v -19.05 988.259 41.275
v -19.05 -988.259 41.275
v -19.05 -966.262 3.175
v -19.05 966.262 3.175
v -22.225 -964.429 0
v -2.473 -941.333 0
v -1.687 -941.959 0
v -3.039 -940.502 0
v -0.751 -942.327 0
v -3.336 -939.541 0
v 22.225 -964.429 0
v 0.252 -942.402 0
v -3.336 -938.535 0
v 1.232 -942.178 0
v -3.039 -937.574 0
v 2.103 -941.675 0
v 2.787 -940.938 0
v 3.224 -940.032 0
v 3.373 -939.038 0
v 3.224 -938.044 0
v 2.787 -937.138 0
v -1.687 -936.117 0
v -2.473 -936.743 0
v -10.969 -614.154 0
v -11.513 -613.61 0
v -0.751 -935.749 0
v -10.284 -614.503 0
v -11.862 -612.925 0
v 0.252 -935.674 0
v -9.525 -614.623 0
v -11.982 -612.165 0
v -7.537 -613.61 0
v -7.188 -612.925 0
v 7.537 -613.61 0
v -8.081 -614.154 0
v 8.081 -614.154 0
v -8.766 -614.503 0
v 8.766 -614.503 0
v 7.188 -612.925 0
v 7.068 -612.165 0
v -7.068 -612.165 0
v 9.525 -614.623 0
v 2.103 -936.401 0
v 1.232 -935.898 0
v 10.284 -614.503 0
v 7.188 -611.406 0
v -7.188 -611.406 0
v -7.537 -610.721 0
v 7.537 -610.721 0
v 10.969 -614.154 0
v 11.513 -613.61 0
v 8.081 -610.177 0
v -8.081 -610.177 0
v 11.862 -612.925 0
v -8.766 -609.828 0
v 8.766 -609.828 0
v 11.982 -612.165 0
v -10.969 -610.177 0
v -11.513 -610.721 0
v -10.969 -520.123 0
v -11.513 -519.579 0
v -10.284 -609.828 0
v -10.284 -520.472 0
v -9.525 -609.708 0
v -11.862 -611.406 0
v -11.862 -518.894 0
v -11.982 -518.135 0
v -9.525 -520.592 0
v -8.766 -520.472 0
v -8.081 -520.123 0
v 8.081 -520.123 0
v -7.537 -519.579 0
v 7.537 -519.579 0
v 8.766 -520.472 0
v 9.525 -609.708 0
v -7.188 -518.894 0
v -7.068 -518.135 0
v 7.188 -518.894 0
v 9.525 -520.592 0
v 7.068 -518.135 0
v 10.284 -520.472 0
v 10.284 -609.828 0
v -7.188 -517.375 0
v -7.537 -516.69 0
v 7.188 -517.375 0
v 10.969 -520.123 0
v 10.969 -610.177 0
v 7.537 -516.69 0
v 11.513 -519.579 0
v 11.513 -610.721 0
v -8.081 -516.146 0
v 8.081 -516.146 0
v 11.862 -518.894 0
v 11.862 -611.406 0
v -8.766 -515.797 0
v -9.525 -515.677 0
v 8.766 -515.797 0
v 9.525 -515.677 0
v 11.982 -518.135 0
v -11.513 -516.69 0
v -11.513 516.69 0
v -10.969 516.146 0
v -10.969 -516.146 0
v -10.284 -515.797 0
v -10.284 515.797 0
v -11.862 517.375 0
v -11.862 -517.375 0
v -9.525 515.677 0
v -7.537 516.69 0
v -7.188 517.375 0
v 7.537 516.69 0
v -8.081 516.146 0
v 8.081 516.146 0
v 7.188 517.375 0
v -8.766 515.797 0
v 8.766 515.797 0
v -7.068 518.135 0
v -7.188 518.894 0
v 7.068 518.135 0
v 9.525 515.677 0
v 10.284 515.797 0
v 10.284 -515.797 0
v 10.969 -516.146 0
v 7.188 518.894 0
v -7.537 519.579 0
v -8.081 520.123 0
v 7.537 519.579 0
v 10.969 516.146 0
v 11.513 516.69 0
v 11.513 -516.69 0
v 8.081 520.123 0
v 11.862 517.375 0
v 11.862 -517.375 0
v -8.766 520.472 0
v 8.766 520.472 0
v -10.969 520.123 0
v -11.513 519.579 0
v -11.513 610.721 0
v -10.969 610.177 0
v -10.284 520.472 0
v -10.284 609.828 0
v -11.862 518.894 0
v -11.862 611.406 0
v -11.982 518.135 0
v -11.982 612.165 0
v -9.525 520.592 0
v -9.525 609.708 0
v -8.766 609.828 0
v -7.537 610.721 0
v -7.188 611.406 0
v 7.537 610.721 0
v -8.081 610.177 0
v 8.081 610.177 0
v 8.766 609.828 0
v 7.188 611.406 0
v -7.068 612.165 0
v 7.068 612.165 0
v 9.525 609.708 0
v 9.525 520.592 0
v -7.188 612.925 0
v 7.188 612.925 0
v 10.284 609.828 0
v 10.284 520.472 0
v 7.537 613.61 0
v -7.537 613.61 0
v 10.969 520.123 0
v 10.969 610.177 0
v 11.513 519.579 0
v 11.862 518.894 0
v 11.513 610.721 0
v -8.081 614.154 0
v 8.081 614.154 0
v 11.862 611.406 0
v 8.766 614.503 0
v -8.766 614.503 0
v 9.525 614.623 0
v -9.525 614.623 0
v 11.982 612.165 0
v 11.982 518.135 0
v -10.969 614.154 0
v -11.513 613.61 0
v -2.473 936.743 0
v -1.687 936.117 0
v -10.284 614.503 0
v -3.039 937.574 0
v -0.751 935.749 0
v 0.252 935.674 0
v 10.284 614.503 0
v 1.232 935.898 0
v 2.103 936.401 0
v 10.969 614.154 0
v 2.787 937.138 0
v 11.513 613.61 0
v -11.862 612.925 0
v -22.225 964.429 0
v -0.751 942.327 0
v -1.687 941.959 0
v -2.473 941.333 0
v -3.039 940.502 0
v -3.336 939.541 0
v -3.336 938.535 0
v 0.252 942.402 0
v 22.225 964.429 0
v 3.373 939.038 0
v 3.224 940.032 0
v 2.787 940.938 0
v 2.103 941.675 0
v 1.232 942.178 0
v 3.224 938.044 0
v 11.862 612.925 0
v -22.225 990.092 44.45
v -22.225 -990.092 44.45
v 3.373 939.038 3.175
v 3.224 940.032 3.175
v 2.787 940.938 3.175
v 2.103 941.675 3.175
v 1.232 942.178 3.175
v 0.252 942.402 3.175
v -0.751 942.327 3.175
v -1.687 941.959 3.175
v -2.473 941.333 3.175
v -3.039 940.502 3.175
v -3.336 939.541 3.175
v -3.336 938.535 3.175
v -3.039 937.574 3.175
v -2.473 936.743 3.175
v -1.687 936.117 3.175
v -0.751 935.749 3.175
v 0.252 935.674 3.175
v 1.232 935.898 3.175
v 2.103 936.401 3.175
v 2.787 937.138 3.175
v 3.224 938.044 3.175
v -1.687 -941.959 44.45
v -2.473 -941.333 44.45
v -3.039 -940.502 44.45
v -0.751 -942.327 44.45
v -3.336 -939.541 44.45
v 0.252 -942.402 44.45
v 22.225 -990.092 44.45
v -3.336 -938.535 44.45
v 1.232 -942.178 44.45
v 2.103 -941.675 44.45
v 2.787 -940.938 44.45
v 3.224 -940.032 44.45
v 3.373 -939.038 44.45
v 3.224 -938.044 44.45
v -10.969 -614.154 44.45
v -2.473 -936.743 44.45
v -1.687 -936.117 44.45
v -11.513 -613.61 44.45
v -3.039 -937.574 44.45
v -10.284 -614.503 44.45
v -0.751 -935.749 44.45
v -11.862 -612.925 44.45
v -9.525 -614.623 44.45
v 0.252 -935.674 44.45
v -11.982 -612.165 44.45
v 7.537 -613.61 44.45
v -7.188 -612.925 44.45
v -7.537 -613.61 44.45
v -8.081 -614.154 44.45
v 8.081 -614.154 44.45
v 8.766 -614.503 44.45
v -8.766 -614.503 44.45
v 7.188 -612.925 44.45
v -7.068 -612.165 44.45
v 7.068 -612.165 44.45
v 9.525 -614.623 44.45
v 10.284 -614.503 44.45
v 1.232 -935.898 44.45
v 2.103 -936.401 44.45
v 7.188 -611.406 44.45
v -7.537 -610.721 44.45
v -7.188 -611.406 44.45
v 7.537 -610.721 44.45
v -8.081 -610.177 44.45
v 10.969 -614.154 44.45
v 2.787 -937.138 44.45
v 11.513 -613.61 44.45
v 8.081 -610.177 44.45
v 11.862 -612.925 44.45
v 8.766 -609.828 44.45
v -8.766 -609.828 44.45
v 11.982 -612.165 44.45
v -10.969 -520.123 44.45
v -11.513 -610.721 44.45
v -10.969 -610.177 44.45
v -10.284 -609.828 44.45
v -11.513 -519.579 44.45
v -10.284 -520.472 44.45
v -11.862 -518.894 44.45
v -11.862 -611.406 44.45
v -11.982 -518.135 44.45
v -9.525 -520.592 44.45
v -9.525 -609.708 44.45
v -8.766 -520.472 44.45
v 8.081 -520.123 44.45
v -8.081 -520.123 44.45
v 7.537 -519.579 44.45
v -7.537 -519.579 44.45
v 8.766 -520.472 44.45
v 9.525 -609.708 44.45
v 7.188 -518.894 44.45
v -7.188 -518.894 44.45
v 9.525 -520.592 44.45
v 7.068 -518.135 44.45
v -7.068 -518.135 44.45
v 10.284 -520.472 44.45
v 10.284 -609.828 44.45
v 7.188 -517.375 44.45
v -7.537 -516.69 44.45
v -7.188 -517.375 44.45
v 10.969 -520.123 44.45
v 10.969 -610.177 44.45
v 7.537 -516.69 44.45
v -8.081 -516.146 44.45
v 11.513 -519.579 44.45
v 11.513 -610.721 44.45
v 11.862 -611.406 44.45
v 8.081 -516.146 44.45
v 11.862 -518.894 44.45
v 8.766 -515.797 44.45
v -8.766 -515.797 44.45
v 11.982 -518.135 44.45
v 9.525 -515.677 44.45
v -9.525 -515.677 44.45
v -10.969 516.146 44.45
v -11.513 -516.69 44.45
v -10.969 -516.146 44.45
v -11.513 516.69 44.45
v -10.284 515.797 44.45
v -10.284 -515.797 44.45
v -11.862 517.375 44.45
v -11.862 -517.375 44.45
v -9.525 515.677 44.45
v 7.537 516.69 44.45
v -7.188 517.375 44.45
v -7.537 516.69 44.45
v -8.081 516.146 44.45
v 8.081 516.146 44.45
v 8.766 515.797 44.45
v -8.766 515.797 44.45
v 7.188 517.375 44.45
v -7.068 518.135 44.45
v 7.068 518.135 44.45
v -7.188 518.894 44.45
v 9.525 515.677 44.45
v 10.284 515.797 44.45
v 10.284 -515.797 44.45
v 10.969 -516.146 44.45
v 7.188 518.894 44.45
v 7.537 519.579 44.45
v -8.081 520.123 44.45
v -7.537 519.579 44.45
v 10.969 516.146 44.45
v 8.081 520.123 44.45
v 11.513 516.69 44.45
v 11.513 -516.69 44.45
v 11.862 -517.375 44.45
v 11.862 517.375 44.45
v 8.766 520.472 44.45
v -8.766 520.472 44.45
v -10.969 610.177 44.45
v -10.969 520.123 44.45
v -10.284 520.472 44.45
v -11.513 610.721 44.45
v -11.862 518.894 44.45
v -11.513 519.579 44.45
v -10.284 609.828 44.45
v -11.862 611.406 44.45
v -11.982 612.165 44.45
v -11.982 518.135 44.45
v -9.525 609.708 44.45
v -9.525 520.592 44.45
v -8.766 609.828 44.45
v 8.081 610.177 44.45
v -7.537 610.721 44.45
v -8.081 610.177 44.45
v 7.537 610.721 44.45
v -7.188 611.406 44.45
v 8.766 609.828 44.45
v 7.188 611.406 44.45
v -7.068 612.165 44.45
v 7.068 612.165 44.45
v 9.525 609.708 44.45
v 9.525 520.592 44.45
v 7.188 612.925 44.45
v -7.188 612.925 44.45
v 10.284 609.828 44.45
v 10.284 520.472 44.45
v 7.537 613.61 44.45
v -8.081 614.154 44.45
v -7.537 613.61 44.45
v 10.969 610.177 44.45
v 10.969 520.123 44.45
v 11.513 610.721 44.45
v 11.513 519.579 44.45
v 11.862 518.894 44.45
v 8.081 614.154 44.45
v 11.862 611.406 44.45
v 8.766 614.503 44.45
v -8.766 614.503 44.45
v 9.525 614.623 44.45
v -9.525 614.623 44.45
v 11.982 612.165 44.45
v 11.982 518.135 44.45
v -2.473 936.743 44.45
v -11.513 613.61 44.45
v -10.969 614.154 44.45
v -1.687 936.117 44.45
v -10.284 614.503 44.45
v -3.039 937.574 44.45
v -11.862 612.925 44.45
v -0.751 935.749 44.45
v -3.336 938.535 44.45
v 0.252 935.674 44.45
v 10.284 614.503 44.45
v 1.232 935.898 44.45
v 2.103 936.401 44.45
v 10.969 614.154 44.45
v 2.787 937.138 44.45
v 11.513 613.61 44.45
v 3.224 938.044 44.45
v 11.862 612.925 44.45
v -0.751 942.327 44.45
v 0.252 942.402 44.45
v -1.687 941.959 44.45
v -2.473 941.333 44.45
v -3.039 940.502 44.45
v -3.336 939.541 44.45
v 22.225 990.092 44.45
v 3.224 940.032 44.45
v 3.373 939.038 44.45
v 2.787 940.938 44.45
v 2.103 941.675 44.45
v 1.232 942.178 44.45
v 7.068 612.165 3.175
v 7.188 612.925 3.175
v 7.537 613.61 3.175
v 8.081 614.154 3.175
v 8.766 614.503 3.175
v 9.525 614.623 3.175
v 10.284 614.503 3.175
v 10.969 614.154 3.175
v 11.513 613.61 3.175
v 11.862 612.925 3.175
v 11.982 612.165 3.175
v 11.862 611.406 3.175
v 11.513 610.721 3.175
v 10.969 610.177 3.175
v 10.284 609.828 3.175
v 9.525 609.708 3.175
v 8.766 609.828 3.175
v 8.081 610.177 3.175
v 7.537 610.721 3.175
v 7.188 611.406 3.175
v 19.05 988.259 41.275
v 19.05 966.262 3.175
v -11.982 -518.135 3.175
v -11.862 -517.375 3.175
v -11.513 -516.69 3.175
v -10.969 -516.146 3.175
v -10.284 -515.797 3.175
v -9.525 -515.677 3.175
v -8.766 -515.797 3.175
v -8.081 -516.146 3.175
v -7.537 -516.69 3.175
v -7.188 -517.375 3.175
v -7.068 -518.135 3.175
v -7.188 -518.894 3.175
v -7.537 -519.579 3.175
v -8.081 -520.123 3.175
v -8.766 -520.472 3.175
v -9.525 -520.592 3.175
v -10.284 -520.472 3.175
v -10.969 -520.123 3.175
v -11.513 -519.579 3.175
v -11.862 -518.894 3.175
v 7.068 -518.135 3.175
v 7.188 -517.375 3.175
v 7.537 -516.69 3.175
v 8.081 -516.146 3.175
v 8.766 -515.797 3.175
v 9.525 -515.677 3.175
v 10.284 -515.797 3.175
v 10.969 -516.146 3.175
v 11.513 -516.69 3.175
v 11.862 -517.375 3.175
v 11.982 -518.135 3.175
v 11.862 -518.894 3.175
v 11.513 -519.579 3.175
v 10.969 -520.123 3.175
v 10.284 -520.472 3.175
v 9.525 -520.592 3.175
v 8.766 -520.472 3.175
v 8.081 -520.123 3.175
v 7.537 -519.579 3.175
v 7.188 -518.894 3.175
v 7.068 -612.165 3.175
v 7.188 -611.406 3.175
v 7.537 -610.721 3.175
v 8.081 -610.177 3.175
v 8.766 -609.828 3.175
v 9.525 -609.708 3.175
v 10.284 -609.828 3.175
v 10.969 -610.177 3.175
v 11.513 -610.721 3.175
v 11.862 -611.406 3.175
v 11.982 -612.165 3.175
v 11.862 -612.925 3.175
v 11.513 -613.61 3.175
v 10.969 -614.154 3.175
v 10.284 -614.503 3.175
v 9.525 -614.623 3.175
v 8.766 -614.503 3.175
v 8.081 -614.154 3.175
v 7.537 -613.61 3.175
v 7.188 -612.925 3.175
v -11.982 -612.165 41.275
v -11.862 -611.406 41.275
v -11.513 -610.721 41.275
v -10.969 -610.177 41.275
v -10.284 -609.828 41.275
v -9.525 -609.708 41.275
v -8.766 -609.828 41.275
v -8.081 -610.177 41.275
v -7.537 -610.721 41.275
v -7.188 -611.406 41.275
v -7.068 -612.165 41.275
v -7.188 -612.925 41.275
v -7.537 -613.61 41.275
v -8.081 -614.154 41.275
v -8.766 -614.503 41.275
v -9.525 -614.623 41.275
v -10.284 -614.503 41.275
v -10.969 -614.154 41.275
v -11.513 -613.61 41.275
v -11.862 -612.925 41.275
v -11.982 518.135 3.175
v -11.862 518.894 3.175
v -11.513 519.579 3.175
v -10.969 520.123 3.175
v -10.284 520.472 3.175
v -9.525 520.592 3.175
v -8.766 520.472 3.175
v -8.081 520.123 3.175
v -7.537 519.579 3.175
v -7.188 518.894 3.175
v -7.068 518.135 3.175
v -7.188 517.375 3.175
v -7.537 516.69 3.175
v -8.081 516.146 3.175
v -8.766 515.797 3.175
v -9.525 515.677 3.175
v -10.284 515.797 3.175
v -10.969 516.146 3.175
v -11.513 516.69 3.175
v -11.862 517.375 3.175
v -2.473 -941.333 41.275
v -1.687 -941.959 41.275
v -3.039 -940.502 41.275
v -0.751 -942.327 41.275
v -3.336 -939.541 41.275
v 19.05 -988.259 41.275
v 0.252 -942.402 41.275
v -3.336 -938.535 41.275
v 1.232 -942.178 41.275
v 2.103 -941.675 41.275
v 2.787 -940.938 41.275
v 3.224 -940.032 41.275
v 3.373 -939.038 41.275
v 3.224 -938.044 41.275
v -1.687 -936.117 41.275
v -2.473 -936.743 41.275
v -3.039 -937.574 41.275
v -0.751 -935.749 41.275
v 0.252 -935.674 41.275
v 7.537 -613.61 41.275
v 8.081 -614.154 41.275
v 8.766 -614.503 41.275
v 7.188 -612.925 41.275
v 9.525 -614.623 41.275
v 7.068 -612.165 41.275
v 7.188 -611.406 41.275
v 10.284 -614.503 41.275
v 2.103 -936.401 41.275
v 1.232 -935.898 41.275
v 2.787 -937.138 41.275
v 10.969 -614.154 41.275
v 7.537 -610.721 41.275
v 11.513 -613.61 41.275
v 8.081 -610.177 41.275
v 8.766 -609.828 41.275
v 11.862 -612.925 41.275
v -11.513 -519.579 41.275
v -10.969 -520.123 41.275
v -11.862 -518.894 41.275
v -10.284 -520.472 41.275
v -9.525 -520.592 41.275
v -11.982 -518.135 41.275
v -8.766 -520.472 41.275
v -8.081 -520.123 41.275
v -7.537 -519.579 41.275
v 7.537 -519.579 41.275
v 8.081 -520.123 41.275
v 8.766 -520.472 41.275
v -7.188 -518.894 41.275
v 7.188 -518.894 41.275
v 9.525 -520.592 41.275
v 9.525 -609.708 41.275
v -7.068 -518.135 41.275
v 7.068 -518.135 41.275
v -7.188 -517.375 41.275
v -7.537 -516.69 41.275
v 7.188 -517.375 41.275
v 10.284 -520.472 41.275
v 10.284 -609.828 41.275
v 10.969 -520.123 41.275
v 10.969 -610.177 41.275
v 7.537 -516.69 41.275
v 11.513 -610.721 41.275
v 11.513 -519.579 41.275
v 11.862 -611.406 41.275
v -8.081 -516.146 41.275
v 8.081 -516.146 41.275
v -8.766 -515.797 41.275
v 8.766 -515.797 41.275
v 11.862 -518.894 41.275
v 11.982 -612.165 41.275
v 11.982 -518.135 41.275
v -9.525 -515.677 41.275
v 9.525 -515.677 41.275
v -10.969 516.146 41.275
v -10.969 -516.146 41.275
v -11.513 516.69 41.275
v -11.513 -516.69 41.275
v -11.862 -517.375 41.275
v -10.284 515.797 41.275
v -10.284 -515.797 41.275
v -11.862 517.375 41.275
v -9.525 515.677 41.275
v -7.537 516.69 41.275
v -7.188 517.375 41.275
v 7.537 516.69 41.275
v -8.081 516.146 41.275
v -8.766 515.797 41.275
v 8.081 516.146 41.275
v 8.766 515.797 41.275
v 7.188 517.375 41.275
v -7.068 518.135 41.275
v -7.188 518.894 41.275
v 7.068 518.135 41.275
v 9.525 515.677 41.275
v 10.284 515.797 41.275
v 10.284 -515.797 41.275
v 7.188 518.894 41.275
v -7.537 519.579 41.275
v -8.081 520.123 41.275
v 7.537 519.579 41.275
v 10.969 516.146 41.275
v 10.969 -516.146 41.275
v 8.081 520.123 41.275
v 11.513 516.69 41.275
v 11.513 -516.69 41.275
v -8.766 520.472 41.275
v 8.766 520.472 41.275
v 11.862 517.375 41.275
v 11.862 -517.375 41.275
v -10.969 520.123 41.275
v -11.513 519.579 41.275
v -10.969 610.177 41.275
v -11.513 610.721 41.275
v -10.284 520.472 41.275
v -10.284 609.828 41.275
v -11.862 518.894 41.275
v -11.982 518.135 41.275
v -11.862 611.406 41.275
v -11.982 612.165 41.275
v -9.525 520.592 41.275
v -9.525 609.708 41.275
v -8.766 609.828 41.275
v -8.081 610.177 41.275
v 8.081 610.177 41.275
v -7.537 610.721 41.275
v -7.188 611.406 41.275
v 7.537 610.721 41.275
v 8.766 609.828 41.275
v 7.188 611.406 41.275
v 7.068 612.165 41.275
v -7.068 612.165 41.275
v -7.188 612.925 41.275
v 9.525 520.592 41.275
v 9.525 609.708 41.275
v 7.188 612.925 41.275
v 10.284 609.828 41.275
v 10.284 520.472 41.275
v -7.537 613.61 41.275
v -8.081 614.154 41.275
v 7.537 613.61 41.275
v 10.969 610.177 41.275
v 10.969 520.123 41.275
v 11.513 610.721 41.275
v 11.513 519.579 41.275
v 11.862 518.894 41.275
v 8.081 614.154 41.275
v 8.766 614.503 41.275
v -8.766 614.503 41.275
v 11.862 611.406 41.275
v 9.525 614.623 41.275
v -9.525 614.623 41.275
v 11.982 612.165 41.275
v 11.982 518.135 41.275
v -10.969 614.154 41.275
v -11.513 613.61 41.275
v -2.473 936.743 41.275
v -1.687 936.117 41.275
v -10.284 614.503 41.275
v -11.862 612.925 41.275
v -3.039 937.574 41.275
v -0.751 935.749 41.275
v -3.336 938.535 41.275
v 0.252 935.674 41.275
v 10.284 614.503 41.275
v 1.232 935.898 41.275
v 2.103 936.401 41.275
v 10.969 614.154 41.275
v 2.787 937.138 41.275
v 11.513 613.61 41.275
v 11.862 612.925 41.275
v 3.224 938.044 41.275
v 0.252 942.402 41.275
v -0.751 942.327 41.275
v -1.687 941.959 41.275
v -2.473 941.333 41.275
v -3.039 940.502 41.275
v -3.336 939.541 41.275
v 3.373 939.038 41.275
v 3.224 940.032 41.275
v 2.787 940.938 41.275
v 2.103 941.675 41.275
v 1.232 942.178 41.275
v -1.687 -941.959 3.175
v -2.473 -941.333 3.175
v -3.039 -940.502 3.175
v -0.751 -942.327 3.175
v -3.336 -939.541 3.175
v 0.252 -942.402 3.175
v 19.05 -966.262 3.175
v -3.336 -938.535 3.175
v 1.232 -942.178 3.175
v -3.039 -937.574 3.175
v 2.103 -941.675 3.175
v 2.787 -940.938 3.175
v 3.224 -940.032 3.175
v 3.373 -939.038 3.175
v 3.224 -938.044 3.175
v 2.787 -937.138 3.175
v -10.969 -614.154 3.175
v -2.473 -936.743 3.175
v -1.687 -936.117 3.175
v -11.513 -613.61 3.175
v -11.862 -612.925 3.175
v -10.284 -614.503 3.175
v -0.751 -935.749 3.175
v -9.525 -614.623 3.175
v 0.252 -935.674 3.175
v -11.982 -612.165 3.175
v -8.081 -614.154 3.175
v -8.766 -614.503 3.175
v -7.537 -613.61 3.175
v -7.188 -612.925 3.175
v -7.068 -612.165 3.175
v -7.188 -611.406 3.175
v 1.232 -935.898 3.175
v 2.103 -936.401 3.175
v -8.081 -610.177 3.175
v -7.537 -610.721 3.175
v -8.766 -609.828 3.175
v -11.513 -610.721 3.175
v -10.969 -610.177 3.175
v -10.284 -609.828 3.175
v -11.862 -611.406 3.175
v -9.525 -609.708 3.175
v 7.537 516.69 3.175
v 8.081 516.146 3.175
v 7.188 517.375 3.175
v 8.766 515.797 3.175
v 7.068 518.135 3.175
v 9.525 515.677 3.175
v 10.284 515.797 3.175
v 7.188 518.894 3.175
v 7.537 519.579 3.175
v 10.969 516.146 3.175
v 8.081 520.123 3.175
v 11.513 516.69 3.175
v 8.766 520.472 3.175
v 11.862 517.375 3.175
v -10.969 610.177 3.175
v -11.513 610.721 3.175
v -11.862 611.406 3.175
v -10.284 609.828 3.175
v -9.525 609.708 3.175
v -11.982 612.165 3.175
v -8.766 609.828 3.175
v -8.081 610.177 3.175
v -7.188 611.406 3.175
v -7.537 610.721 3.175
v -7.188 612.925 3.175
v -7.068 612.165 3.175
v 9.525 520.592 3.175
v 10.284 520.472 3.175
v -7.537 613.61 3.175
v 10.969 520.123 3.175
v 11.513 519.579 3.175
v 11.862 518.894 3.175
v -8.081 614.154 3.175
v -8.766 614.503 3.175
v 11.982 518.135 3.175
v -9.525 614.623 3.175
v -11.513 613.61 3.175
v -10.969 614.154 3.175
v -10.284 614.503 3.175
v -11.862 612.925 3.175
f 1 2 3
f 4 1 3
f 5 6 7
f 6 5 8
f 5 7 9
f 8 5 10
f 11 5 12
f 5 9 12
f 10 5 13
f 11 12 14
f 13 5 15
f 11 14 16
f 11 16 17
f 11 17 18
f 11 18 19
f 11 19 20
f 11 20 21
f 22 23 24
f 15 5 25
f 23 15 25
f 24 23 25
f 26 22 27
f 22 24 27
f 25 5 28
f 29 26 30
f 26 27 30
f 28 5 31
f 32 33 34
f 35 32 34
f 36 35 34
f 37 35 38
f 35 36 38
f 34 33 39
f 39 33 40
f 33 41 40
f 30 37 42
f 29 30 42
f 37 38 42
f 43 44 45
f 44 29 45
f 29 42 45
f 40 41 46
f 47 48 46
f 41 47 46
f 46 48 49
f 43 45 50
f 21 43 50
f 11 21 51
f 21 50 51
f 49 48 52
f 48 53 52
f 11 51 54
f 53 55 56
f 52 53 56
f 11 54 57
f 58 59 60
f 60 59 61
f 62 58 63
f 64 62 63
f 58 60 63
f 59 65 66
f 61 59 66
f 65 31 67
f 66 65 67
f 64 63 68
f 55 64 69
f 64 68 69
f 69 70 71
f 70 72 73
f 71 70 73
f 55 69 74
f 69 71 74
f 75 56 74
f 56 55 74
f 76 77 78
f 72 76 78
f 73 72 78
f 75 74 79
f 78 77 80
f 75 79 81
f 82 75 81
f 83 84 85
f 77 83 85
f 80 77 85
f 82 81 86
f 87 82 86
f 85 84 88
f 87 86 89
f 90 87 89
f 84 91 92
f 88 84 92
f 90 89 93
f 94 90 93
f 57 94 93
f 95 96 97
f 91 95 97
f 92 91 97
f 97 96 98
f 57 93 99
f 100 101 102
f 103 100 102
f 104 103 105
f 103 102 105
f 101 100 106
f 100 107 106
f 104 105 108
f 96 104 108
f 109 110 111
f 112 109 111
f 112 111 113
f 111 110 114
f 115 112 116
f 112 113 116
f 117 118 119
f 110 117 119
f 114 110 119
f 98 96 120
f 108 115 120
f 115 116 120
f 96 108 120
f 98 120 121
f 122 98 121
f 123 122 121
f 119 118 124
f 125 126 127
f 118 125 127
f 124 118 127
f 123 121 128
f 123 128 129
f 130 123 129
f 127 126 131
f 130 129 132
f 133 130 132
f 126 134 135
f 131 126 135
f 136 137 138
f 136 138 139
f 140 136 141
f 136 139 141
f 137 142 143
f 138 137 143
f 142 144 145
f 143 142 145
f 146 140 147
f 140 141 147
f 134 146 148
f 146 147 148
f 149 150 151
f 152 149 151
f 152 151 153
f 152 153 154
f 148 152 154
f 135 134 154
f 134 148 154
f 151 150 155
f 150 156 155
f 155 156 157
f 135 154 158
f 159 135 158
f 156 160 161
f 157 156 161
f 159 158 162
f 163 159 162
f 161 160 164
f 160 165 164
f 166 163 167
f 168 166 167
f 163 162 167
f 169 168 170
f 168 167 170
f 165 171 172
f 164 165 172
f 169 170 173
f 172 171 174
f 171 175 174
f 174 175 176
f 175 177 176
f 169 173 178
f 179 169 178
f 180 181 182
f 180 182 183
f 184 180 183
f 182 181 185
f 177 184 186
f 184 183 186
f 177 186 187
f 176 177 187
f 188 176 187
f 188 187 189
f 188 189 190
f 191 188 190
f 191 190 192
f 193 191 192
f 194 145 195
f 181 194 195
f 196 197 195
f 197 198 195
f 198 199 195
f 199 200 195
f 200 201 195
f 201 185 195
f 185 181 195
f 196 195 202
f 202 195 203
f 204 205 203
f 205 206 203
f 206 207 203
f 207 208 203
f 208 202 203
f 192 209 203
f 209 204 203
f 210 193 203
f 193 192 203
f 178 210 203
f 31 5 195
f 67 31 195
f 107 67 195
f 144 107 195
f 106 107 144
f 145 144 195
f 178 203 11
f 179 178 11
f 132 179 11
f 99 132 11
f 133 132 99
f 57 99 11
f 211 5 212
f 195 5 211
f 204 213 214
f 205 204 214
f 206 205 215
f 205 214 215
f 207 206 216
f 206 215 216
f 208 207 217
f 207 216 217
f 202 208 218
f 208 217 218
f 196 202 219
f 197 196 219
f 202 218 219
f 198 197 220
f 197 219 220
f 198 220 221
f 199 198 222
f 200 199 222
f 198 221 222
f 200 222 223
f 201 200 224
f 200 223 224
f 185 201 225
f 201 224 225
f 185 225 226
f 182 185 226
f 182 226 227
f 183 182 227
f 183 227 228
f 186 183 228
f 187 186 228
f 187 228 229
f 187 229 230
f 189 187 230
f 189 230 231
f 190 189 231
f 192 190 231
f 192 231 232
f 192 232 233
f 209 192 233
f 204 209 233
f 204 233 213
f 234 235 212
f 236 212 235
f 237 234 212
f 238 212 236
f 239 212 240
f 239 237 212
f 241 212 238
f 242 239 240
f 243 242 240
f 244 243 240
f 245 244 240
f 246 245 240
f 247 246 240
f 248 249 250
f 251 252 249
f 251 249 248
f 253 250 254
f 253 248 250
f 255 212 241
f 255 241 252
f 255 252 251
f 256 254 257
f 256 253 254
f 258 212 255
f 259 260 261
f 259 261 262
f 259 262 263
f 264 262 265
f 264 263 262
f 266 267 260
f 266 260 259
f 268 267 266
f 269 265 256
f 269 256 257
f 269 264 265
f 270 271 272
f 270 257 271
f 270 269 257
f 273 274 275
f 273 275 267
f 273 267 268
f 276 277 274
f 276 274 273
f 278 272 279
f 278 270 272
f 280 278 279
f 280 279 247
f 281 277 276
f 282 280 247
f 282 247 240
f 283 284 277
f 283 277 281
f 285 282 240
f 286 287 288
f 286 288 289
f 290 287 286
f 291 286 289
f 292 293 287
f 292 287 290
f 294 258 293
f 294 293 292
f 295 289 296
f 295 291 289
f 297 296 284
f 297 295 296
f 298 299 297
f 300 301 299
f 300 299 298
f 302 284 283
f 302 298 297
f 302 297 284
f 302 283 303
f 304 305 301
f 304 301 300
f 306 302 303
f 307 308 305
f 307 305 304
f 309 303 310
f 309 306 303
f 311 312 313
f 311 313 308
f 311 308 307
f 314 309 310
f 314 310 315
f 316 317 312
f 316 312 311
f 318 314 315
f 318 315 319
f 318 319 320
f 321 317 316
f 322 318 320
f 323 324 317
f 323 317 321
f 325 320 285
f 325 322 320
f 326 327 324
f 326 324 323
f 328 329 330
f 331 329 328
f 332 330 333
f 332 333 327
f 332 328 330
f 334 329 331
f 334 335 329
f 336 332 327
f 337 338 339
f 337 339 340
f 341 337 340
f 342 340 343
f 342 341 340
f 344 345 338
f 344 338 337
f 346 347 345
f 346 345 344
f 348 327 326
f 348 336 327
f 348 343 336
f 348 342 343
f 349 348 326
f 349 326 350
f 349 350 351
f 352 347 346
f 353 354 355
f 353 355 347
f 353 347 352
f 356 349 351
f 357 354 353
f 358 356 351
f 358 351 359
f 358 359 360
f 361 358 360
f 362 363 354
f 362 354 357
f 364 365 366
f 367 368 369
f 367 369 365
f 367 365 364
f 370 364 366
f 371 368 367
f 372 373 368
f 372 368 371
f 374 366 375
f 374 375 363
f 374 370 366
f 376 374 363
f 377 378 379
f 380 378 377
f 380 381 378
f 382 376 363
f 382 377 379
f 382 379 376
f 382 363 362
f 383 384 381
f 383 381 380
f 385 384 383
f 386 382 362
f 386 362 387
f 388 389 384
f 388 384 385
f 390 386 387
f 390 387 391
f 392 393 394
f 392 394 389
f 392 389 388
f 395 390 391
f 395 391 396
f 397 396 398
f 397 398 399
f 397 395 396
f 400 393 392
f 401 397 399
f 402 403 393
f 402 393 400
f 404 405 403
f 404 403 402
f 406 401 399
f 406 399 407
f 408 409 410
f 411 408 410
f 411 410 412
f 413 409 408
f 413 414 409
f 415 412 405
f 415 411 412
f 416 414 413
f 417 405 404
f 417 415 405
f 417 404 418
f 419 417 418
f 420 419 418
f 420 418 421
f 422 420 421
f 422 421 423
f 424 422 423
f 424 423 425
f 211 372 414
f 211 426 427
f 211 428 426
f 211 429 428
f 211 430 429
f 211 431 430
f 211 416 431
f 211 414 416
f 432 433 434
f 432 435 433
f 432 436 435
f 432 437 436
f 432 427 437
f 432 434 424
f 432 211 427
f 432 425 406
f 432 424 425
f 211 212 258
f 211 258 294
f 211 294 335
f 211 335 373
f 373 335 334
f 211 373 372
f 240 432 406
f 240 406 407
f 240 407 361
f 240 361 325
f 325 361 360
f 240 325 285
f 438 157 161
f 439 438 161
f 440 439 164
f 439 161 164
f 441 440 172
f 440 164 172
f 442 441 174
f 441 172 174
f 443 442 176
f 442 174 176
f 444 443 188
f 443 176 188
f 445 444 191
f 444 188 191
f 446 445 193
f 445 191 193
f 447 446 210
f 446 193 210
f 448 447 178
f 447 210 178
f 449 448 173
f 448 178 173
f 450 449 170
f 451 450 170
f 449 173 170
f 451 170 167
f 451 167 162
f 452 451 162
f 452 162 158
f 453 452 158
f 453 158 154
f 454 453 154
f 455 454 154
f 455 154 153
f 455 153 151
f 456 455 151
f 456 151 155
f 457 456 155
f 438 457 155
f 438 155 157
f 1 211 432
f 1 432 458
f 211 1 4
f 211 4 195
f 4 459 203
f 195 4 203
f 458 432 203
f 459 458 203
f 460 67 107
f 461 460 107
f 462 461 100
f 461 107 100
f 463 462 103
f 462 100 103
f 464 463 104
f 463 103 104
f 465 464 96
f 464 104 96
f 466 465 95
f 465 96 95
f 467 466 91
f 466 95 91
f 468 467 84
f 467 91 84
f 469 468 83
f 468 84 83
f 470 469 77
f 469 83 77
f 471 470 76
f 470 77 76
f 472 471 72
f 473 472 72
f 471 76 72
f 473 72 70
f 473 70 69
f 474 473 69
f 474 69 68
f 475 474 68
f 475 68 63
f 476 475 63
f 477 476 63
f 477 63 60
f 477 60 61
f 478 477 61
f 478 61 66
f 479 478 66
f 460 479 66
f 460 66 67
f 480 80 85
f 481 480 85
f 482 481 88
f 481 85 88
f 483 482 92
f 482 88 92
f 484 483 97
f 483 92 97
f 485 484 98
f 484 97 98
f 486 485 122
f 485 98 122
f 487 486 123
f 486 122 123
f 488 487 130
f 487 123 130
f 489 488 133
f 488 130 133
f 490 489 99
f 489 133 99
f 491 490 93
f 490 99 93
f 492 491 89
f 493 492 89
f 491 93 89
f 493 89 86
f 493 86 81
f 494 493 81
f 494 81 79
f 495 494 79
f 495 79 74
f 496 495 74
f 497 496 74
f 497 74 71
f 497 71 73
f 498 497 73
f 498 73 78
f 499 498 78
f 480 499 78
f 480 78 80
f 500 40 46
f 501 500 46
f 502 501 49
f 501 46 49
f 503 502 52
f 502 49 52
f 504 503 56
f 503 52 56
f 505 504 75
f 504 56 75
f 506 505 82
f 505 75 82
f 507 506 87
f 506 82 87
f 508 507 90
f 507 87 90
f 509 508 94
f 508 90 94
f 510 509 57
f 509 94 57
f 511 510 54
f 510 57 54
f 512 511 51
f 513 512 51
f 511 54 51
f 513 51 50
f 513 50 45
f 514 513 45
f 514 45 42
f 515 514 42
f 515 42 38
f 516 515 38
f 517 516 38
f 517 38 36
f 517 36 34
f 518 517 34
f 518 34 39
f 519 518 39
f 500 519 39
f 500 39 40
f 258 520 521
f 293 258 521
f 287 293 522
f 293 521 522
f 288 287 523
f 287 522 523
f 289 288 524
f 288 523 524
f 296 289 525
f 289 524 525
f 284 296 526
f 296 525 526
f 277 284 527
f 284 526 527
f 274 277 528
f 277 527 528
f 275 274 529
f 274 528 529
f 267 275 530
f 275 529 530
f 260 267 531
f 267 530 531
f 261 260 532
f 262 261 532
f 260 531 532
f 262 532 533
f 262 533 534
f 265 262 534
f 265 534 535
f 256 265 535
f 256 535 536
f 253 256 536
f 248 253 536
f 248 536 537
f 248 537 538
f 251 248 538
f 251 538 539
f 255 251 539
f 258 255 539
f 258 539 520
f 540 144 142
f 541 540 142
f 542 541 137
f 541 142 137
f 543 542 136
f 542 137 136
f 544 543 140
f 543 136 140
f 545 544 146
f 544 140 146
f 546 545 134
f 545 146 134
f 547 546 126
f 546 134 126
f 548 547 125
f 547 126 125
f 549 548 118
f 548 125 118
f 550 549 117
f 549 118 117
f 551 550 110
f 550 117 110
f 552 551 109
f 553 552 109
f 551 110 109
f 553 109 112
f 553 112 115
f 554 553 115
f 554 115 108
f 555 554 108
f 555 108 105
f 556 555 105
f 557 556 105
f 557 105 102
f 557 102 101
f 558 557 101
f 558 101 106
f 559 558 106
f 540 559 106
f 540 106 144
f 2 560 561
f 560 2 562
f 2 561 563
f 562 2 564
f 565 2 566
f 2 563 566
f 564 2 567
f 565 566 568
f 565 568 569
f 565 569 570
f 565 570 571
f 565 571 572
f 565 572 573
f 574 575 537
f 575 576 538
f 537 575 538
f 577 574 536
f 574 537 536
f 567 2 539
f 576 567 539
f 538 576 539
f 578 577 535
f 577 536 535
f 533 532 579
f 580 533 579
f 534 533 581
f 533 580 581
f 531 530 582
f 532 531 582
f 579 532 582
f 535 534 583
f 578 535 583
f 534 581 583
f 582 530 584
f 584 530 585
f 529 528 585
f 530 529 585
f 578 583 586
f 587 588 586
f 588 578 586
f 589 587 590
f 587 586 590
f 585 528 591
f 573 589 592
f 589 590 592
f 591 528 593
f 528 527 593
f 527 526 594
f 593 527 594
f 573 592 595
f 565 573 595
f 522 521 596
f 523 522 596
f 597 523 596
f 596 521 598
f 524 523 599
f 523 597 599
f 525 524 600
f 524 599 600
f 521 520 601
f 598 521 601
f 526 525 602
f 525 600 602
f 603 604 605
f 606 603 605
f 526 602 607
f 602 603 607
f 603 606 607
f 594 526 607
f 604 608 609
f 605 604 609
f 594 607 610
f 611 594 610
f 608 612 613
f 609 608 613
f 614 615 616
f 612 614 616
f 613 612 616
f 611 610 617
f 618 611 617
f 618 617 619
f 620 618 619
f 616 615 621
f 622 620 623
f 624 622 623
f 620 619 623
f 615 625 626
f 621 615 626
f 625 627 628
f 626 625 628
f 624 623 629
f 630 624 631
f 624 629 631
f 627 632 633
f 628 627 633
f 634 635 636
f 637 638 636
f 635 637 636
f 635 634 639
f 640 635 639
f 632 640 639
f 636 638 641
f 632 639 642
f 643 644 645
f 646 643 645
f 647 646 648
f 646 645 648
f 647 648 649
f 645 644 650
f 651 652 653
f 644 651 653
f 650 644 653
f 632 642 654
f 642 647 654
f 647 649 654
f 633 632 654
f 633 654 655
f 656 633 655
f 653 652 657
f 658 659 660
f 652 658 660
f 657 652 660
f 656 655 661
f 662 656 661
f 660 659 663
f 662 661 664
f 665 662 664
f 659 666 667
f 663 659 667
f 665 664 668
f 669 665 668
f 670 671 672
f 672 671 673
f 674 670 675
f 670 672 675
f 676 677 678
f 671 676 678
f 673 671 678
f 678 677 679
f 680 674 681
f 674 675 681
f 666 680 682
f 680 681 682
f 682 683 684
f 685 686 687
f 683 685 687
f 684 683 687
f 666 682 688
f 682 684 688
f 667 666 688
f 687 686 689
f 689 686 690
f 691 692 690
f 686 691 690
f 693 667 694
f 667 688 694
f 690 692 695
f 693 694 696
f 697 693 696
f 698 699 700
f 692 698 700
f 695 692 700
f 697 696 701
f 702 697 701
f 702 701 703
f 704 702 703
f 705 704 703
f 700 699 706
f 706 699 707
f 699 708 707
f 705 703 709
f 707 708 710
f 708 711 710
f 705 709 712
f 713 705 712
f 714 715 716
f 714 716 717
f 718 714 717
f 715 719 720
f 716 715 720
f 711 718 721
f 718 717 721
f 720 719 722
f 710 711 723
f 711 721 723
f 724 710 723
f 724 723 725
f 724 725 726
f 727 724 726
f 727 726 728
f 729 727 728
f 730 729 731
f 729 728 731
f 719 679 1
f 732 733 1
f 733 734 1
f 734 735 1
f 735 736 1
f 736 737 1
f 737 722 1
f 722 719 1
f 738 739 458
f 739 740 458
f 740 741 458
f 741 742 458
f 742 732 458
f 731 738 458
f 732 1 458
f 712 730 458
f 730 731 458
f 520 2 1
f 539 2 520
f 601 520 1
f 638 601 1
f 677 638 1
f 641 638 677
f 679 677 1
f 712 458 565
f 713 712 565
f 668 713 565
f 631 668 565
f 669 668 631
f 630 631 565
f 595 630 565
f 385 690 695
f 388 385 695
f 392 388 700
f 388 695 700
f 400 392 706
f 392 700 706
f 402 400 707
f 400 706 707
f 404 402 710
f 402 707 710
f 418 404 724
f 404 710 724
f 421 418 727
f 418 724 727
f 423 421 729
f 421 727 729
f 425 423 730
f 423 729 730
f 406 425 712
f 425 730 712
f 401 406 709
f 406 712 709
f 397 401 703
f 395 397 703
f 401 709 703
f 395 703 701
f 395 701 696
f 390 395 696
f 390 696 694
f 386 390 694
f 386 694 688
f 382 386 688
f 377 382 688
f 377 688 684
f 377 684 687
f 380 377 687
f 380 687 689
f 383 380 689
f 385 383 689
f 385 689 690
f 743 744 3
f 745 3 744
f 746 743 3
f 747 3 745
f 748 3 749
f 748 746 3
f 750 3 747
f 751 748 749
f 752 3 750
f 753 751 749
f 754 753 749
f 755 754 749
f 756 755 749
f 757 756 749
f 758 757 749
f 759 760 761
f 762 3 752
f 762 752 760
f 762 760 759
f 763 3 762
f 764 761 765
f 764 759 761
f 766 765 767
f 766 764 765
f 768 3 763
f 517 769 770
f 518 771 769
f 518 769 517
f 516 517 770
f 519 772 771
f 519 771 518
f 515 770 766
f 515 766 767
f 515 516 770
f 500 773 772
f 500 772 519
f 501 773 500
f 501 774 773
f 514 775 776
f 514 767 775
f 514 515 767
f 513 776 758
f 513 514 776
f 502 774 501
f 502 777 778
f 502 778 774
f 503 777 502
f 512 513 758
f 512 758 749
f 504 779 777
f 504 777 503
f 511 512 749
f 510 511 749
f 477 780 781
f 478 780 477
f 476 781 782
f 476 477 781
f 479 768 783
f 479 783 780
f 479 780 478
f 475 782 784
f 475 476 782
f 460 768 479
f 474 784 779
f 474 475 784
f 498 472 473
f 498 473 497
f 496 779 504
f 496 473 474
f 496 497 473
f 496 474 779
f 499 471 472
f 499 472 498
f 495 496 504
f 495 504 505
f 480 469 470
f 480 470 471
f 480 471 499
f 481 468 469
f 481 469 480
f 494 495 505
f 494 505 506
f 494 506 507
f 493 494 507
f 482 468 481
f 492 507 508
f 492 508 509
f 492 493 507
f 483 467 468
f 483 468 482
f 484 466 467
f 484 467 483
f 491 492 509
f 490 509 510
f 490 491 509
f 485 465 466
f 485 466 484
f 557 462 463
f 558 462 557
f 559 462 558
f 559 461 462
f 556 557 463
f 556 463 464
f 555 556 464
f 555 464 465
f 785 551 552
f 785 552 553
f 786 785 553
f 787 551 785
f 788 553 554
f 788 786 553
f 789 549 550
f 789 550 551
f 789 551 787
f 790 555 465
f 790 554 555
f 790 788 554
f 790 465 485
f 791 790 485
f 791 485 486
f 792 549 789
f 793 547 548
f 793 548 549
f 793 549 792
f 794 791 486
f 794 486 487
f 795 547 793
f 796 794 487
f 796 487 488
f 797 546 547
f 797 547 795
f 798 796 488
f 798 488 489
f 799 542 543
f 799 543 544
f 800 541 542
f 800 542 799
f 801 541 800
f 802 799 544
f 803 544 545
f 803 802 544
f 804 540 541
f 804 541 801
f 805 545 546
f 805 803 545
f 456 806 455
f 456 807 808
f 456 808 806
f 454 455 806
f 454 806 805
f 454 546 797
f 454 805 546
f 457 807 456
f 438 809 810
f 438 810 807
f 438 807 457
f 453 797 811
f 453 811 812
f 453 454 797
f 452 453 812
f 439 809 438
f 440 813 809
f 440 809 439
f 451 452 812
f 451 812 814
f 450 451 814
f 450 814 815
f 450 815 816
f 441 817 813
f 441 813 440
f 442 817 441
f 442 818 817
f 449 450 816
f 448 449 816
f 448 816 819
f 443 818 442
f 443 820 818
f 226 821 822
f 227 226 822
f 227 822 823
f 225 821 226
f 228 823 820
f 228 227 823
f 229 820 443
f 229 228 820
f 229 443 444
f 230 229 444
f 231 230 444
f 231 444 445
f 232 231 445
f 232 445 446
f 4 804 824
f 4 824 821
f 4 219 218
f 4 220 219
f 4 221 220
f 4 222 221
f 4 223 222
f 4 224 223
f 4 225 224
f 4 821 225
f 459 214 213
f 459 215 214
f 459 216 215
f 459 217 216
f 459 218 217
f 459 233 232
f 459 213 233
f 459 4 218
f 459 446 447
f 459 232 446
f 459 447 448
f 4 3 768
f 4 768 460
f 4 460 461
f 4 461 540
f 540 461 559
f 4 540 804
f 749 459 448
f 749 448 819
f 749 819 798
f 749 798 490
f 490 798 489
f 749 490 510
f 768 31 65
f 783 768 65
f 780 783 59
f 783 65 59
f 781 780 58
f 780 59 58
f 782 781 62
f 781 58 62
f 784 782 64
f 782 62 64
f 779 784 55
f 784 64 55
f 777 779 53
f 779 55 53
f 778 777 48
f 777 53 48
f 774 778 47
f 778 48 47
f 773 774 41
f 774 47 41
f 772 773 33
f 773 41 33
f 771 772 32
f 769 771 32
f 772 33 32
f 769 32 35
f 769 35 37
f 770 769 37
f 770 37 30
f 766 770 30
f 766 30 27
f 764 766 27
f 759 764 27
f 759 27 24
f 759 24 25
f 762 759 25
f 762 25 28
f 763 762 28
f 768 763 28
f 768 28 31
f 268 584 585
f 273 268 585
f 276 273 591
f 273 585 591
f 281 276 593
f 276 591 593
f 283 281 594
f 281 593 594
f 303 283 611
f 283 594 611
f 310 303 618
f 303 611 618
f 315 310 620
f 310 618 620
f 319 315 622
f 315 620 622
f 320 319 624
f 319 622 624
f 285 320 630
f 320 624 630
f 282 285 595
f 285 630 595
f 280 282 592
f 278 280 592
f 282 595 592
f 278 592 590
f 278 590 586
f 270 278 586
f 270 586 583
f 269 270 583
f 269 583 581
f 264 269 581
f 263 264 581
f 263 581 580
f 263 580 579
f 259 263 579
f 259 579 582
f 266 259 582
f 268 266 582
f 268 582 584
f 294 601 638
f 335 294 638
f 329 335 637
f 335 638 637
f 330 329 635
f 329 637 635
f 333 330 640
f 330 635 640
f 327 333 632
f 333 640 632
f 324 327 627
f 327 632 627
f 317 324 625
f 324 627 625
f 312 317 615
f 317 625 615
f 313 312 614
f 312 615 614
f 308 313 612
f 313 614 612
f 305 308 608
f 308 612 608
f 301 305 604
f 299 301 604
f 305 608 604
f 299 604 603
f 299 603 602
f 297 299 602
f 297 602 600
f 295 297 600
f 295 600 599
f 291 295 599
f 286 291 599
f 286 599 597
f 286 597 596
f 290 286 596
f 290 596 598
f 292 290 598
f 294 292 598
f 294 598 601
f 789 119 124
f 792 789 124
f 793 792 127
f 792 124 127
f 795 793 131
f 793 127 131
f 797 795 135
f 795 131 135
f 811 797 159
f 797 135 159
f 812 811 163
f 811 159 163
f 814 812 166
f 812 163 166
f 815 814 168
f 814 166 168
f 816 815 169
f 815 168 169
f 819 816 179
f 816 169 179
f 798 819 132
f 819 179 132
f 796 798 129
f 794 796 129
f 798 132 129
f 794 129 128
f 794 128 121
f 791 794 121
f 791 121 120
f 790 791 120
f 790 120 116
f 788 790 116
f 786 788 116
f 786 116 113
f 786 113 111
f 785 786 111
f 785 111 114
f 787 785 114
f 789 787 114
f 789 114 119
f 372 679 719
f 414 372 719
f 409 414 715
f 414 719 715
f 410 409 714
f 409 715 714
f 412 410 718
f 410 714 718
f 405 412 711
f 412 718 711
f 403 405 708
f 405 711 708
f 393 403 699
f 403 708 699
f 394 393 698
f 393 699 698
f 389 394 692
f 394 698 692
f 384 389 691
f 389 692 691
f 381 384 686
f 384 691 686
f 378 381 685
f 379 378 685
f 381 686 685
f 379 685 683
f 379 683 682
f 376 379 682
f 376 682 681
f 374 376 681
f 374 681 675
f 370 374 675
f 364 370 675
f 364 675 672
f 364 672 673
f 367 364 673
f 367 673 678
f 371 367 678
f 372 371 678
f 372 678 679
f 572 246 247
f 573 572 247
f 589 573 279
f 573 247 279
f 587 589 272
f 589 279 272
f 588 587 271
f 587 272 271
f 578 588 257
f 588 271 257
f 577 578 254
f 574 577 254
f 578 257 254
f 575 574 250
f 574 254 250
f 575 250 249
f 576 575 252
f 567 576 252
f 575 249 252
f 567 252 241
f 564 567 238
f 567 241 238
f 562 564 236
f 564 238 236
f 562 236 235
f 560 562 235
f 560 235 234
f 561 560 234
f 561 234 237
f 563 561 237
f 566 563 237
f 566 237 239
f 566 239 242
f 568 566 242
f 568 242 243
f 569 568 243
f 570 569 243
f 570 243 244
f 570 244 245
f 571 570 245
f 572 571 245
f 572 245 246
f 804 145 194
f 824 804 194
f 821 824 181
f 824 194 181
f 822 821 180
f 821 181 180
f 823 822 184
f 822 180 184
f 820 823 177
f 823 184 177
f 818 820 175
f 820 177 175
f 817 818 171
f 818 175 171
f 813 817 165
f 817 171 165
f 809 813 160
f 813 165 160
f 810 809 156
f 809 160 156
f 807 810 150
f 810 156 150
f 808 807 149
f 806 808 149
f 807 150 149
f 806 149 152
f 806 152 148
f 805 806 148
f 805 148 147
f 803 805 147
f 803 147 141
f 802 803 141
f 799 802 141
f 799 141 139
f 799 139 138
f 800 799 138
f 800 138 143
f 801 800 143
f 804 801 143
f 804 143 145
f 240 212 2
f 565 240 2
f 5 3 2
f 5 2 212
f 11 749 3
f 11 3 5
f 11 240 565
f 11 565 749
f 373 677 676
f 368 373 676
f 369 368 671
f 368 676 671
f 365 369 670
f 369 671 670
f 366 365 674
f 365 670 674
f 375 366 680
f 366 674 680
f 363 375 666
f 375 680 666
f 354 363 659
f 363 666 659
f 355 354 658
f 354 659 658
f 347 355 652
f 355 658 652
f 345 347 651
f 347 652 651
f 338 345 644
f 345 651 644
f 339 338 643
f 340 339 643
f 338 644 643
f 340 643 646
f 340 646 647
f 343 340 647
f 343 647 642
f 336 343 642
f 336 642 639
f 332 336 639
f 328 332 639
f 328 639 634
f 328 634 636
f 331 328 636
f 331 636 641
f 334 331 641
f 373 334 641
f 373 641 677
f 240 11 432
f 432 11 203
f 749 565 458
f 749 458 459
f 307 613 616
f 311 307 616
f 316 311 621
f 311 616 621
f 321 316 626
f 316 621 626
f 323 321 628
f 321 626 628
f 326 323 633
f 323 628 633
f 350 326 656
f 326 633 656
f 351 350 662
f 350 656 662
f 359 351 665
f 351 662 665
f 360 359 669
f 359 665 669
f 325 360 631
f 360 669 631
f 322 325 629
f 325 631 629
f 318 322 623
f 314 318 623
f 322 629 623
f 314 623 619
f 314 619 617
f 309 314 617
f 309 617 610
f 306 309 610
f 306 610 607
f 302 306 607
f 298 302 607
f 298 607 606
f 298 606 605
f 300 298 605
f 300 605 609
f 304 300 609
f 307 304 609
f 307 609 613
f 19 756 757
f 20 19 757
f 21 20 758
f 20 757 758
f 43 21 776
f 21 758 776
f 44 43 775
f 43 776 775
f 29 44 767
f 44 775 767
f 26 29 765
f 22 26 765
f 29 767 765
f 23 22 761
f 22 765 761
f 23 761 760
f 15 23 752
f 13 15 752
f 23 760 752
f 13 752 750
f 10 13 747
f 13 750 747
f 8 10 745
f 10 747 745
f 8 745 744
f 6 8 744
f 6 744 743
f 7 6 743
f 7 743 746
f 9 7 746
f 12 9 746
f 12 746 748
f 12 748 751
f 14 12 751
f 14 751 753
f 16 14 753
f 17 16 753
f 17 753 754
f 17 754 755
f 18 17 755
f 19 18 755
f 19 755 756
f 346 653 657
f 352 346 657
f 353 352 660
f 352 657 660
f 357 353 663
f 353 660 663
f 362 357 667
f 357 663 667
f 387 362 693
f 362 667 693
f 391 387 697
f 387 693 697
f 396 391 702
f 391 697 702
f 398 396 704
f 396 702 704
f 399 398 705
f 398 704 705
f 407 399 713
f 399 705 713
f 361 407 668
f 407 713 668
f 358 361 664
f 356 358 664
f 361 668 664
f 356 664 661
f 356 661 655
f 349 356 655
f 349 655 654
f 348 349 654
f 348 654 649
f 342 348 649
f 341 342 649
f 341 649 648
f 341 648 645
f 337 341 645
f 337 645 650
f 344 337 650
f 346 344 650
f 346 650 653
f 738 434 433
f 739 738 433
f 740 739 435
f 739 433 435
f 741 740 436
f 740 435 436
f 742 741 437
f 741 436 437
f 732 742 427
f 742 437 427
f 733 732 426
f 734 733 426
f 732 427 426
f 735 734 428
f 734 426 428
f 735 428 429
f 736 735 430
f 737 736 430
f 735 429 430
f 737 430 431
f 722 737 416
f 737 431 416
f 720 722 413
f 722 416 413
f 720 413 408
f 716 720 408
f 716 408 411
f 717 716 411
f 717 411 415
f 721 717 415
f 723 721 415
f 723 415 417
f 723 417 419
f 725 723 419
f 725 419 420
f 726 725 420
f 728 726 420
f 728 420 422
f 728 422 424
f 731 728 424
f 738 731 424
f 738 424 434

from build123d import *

# Parameters (mm, degrees)
SKETCH1_W                    = 44.45
SKETCH1_H                    = 1980.184
BOSS_EXTRUDE1_DEPTH          = 44.45
SKETCH2_W                    = 38.1
SKETCH2_H                    = 38.1
CUT_EXTRUDE1_DEPTH           = 1981.807518913
CUT_EXTRUDE2_DEPTH           = 993.085567612
SKETCH13_R                   = 3.3734375
CUT_EXTRUDE7_DEPTH           = 992.338449567
F_10_0_1935_DIAMETER_HOLE1_D = 4.9149


with BuildPart() as part:
    # Sketch1 → Boss-Extrude1 (new body)
    with BuildSketch(Plane.XY):
        Rectangle(SKETCH1_W, SKETCH1_H)
    extrude(amount=BOSS_EXTRUDE1_DEPTH)

    # Sketch2 → Cut-Extrude1 (cut, through all)
    with BuildSketch(Plane(origin=(0, 990.092, 0), x_dir=(1, 0, 0), z_dir=(0, 1, 0))):
        with Locations((0, -22.225)):
            Rectangle(SKETCH2_W, SKETCH2_H)
    extrude(amount=-CUT_EXTRUDE1_DEPTH, mode=Mode.SUBTRACT)

    # Sketch3 → Cut-Extrude2 (cut, through all)
    with BuildSketch(Plane(origin=(22.225, 0, 0), x_dir=(0, 0, -1), z_dir=(1, 0, 0))):
        Polygon((-44.45, 990.092), (0, 964.428780535), (0, 990.092), align=None)
        Polygon((-44.45, -990.092), (0, -964.428780535), (0, -990.092), align=None)
    extrude(amount=-CUT_EXTRUDE2_DEPTH, mode=Mode.SUBTRACT)

    # Sketch13 → Cut-Extrude7 (cut, through all)
    with BuildSketch(Plane.XY.offset(44.45)):
        with Locations((0, 939.038)):
            Circle(SKETCH13_R)
        with Locations((0, -939.038)):
            Circle(SKETCH13_R)
    extrude(amount=-CUT_EXTRUDE7_DEPTH, mode=Mode.SUBTRACT)

    # #10 (0.1935) Diameter Hole1 (through all)
    with Locations(Plane(origin=(-9.525, -612.1654, 44.45), x_dir=(1, 0, 0), z_dir=(0, 0, 1))):
        with Locations((0, 0), (19.05, 0), (0, 94.0308), (19.05, 94.0308), (0, 1130.3), (19.05, 1130.3), (0, 1224.3308), (19.05, 1224.3308)):
            Hole(F_10_0_1935_DIAMETER_HOLE1_D / 2)


solid = part.part
